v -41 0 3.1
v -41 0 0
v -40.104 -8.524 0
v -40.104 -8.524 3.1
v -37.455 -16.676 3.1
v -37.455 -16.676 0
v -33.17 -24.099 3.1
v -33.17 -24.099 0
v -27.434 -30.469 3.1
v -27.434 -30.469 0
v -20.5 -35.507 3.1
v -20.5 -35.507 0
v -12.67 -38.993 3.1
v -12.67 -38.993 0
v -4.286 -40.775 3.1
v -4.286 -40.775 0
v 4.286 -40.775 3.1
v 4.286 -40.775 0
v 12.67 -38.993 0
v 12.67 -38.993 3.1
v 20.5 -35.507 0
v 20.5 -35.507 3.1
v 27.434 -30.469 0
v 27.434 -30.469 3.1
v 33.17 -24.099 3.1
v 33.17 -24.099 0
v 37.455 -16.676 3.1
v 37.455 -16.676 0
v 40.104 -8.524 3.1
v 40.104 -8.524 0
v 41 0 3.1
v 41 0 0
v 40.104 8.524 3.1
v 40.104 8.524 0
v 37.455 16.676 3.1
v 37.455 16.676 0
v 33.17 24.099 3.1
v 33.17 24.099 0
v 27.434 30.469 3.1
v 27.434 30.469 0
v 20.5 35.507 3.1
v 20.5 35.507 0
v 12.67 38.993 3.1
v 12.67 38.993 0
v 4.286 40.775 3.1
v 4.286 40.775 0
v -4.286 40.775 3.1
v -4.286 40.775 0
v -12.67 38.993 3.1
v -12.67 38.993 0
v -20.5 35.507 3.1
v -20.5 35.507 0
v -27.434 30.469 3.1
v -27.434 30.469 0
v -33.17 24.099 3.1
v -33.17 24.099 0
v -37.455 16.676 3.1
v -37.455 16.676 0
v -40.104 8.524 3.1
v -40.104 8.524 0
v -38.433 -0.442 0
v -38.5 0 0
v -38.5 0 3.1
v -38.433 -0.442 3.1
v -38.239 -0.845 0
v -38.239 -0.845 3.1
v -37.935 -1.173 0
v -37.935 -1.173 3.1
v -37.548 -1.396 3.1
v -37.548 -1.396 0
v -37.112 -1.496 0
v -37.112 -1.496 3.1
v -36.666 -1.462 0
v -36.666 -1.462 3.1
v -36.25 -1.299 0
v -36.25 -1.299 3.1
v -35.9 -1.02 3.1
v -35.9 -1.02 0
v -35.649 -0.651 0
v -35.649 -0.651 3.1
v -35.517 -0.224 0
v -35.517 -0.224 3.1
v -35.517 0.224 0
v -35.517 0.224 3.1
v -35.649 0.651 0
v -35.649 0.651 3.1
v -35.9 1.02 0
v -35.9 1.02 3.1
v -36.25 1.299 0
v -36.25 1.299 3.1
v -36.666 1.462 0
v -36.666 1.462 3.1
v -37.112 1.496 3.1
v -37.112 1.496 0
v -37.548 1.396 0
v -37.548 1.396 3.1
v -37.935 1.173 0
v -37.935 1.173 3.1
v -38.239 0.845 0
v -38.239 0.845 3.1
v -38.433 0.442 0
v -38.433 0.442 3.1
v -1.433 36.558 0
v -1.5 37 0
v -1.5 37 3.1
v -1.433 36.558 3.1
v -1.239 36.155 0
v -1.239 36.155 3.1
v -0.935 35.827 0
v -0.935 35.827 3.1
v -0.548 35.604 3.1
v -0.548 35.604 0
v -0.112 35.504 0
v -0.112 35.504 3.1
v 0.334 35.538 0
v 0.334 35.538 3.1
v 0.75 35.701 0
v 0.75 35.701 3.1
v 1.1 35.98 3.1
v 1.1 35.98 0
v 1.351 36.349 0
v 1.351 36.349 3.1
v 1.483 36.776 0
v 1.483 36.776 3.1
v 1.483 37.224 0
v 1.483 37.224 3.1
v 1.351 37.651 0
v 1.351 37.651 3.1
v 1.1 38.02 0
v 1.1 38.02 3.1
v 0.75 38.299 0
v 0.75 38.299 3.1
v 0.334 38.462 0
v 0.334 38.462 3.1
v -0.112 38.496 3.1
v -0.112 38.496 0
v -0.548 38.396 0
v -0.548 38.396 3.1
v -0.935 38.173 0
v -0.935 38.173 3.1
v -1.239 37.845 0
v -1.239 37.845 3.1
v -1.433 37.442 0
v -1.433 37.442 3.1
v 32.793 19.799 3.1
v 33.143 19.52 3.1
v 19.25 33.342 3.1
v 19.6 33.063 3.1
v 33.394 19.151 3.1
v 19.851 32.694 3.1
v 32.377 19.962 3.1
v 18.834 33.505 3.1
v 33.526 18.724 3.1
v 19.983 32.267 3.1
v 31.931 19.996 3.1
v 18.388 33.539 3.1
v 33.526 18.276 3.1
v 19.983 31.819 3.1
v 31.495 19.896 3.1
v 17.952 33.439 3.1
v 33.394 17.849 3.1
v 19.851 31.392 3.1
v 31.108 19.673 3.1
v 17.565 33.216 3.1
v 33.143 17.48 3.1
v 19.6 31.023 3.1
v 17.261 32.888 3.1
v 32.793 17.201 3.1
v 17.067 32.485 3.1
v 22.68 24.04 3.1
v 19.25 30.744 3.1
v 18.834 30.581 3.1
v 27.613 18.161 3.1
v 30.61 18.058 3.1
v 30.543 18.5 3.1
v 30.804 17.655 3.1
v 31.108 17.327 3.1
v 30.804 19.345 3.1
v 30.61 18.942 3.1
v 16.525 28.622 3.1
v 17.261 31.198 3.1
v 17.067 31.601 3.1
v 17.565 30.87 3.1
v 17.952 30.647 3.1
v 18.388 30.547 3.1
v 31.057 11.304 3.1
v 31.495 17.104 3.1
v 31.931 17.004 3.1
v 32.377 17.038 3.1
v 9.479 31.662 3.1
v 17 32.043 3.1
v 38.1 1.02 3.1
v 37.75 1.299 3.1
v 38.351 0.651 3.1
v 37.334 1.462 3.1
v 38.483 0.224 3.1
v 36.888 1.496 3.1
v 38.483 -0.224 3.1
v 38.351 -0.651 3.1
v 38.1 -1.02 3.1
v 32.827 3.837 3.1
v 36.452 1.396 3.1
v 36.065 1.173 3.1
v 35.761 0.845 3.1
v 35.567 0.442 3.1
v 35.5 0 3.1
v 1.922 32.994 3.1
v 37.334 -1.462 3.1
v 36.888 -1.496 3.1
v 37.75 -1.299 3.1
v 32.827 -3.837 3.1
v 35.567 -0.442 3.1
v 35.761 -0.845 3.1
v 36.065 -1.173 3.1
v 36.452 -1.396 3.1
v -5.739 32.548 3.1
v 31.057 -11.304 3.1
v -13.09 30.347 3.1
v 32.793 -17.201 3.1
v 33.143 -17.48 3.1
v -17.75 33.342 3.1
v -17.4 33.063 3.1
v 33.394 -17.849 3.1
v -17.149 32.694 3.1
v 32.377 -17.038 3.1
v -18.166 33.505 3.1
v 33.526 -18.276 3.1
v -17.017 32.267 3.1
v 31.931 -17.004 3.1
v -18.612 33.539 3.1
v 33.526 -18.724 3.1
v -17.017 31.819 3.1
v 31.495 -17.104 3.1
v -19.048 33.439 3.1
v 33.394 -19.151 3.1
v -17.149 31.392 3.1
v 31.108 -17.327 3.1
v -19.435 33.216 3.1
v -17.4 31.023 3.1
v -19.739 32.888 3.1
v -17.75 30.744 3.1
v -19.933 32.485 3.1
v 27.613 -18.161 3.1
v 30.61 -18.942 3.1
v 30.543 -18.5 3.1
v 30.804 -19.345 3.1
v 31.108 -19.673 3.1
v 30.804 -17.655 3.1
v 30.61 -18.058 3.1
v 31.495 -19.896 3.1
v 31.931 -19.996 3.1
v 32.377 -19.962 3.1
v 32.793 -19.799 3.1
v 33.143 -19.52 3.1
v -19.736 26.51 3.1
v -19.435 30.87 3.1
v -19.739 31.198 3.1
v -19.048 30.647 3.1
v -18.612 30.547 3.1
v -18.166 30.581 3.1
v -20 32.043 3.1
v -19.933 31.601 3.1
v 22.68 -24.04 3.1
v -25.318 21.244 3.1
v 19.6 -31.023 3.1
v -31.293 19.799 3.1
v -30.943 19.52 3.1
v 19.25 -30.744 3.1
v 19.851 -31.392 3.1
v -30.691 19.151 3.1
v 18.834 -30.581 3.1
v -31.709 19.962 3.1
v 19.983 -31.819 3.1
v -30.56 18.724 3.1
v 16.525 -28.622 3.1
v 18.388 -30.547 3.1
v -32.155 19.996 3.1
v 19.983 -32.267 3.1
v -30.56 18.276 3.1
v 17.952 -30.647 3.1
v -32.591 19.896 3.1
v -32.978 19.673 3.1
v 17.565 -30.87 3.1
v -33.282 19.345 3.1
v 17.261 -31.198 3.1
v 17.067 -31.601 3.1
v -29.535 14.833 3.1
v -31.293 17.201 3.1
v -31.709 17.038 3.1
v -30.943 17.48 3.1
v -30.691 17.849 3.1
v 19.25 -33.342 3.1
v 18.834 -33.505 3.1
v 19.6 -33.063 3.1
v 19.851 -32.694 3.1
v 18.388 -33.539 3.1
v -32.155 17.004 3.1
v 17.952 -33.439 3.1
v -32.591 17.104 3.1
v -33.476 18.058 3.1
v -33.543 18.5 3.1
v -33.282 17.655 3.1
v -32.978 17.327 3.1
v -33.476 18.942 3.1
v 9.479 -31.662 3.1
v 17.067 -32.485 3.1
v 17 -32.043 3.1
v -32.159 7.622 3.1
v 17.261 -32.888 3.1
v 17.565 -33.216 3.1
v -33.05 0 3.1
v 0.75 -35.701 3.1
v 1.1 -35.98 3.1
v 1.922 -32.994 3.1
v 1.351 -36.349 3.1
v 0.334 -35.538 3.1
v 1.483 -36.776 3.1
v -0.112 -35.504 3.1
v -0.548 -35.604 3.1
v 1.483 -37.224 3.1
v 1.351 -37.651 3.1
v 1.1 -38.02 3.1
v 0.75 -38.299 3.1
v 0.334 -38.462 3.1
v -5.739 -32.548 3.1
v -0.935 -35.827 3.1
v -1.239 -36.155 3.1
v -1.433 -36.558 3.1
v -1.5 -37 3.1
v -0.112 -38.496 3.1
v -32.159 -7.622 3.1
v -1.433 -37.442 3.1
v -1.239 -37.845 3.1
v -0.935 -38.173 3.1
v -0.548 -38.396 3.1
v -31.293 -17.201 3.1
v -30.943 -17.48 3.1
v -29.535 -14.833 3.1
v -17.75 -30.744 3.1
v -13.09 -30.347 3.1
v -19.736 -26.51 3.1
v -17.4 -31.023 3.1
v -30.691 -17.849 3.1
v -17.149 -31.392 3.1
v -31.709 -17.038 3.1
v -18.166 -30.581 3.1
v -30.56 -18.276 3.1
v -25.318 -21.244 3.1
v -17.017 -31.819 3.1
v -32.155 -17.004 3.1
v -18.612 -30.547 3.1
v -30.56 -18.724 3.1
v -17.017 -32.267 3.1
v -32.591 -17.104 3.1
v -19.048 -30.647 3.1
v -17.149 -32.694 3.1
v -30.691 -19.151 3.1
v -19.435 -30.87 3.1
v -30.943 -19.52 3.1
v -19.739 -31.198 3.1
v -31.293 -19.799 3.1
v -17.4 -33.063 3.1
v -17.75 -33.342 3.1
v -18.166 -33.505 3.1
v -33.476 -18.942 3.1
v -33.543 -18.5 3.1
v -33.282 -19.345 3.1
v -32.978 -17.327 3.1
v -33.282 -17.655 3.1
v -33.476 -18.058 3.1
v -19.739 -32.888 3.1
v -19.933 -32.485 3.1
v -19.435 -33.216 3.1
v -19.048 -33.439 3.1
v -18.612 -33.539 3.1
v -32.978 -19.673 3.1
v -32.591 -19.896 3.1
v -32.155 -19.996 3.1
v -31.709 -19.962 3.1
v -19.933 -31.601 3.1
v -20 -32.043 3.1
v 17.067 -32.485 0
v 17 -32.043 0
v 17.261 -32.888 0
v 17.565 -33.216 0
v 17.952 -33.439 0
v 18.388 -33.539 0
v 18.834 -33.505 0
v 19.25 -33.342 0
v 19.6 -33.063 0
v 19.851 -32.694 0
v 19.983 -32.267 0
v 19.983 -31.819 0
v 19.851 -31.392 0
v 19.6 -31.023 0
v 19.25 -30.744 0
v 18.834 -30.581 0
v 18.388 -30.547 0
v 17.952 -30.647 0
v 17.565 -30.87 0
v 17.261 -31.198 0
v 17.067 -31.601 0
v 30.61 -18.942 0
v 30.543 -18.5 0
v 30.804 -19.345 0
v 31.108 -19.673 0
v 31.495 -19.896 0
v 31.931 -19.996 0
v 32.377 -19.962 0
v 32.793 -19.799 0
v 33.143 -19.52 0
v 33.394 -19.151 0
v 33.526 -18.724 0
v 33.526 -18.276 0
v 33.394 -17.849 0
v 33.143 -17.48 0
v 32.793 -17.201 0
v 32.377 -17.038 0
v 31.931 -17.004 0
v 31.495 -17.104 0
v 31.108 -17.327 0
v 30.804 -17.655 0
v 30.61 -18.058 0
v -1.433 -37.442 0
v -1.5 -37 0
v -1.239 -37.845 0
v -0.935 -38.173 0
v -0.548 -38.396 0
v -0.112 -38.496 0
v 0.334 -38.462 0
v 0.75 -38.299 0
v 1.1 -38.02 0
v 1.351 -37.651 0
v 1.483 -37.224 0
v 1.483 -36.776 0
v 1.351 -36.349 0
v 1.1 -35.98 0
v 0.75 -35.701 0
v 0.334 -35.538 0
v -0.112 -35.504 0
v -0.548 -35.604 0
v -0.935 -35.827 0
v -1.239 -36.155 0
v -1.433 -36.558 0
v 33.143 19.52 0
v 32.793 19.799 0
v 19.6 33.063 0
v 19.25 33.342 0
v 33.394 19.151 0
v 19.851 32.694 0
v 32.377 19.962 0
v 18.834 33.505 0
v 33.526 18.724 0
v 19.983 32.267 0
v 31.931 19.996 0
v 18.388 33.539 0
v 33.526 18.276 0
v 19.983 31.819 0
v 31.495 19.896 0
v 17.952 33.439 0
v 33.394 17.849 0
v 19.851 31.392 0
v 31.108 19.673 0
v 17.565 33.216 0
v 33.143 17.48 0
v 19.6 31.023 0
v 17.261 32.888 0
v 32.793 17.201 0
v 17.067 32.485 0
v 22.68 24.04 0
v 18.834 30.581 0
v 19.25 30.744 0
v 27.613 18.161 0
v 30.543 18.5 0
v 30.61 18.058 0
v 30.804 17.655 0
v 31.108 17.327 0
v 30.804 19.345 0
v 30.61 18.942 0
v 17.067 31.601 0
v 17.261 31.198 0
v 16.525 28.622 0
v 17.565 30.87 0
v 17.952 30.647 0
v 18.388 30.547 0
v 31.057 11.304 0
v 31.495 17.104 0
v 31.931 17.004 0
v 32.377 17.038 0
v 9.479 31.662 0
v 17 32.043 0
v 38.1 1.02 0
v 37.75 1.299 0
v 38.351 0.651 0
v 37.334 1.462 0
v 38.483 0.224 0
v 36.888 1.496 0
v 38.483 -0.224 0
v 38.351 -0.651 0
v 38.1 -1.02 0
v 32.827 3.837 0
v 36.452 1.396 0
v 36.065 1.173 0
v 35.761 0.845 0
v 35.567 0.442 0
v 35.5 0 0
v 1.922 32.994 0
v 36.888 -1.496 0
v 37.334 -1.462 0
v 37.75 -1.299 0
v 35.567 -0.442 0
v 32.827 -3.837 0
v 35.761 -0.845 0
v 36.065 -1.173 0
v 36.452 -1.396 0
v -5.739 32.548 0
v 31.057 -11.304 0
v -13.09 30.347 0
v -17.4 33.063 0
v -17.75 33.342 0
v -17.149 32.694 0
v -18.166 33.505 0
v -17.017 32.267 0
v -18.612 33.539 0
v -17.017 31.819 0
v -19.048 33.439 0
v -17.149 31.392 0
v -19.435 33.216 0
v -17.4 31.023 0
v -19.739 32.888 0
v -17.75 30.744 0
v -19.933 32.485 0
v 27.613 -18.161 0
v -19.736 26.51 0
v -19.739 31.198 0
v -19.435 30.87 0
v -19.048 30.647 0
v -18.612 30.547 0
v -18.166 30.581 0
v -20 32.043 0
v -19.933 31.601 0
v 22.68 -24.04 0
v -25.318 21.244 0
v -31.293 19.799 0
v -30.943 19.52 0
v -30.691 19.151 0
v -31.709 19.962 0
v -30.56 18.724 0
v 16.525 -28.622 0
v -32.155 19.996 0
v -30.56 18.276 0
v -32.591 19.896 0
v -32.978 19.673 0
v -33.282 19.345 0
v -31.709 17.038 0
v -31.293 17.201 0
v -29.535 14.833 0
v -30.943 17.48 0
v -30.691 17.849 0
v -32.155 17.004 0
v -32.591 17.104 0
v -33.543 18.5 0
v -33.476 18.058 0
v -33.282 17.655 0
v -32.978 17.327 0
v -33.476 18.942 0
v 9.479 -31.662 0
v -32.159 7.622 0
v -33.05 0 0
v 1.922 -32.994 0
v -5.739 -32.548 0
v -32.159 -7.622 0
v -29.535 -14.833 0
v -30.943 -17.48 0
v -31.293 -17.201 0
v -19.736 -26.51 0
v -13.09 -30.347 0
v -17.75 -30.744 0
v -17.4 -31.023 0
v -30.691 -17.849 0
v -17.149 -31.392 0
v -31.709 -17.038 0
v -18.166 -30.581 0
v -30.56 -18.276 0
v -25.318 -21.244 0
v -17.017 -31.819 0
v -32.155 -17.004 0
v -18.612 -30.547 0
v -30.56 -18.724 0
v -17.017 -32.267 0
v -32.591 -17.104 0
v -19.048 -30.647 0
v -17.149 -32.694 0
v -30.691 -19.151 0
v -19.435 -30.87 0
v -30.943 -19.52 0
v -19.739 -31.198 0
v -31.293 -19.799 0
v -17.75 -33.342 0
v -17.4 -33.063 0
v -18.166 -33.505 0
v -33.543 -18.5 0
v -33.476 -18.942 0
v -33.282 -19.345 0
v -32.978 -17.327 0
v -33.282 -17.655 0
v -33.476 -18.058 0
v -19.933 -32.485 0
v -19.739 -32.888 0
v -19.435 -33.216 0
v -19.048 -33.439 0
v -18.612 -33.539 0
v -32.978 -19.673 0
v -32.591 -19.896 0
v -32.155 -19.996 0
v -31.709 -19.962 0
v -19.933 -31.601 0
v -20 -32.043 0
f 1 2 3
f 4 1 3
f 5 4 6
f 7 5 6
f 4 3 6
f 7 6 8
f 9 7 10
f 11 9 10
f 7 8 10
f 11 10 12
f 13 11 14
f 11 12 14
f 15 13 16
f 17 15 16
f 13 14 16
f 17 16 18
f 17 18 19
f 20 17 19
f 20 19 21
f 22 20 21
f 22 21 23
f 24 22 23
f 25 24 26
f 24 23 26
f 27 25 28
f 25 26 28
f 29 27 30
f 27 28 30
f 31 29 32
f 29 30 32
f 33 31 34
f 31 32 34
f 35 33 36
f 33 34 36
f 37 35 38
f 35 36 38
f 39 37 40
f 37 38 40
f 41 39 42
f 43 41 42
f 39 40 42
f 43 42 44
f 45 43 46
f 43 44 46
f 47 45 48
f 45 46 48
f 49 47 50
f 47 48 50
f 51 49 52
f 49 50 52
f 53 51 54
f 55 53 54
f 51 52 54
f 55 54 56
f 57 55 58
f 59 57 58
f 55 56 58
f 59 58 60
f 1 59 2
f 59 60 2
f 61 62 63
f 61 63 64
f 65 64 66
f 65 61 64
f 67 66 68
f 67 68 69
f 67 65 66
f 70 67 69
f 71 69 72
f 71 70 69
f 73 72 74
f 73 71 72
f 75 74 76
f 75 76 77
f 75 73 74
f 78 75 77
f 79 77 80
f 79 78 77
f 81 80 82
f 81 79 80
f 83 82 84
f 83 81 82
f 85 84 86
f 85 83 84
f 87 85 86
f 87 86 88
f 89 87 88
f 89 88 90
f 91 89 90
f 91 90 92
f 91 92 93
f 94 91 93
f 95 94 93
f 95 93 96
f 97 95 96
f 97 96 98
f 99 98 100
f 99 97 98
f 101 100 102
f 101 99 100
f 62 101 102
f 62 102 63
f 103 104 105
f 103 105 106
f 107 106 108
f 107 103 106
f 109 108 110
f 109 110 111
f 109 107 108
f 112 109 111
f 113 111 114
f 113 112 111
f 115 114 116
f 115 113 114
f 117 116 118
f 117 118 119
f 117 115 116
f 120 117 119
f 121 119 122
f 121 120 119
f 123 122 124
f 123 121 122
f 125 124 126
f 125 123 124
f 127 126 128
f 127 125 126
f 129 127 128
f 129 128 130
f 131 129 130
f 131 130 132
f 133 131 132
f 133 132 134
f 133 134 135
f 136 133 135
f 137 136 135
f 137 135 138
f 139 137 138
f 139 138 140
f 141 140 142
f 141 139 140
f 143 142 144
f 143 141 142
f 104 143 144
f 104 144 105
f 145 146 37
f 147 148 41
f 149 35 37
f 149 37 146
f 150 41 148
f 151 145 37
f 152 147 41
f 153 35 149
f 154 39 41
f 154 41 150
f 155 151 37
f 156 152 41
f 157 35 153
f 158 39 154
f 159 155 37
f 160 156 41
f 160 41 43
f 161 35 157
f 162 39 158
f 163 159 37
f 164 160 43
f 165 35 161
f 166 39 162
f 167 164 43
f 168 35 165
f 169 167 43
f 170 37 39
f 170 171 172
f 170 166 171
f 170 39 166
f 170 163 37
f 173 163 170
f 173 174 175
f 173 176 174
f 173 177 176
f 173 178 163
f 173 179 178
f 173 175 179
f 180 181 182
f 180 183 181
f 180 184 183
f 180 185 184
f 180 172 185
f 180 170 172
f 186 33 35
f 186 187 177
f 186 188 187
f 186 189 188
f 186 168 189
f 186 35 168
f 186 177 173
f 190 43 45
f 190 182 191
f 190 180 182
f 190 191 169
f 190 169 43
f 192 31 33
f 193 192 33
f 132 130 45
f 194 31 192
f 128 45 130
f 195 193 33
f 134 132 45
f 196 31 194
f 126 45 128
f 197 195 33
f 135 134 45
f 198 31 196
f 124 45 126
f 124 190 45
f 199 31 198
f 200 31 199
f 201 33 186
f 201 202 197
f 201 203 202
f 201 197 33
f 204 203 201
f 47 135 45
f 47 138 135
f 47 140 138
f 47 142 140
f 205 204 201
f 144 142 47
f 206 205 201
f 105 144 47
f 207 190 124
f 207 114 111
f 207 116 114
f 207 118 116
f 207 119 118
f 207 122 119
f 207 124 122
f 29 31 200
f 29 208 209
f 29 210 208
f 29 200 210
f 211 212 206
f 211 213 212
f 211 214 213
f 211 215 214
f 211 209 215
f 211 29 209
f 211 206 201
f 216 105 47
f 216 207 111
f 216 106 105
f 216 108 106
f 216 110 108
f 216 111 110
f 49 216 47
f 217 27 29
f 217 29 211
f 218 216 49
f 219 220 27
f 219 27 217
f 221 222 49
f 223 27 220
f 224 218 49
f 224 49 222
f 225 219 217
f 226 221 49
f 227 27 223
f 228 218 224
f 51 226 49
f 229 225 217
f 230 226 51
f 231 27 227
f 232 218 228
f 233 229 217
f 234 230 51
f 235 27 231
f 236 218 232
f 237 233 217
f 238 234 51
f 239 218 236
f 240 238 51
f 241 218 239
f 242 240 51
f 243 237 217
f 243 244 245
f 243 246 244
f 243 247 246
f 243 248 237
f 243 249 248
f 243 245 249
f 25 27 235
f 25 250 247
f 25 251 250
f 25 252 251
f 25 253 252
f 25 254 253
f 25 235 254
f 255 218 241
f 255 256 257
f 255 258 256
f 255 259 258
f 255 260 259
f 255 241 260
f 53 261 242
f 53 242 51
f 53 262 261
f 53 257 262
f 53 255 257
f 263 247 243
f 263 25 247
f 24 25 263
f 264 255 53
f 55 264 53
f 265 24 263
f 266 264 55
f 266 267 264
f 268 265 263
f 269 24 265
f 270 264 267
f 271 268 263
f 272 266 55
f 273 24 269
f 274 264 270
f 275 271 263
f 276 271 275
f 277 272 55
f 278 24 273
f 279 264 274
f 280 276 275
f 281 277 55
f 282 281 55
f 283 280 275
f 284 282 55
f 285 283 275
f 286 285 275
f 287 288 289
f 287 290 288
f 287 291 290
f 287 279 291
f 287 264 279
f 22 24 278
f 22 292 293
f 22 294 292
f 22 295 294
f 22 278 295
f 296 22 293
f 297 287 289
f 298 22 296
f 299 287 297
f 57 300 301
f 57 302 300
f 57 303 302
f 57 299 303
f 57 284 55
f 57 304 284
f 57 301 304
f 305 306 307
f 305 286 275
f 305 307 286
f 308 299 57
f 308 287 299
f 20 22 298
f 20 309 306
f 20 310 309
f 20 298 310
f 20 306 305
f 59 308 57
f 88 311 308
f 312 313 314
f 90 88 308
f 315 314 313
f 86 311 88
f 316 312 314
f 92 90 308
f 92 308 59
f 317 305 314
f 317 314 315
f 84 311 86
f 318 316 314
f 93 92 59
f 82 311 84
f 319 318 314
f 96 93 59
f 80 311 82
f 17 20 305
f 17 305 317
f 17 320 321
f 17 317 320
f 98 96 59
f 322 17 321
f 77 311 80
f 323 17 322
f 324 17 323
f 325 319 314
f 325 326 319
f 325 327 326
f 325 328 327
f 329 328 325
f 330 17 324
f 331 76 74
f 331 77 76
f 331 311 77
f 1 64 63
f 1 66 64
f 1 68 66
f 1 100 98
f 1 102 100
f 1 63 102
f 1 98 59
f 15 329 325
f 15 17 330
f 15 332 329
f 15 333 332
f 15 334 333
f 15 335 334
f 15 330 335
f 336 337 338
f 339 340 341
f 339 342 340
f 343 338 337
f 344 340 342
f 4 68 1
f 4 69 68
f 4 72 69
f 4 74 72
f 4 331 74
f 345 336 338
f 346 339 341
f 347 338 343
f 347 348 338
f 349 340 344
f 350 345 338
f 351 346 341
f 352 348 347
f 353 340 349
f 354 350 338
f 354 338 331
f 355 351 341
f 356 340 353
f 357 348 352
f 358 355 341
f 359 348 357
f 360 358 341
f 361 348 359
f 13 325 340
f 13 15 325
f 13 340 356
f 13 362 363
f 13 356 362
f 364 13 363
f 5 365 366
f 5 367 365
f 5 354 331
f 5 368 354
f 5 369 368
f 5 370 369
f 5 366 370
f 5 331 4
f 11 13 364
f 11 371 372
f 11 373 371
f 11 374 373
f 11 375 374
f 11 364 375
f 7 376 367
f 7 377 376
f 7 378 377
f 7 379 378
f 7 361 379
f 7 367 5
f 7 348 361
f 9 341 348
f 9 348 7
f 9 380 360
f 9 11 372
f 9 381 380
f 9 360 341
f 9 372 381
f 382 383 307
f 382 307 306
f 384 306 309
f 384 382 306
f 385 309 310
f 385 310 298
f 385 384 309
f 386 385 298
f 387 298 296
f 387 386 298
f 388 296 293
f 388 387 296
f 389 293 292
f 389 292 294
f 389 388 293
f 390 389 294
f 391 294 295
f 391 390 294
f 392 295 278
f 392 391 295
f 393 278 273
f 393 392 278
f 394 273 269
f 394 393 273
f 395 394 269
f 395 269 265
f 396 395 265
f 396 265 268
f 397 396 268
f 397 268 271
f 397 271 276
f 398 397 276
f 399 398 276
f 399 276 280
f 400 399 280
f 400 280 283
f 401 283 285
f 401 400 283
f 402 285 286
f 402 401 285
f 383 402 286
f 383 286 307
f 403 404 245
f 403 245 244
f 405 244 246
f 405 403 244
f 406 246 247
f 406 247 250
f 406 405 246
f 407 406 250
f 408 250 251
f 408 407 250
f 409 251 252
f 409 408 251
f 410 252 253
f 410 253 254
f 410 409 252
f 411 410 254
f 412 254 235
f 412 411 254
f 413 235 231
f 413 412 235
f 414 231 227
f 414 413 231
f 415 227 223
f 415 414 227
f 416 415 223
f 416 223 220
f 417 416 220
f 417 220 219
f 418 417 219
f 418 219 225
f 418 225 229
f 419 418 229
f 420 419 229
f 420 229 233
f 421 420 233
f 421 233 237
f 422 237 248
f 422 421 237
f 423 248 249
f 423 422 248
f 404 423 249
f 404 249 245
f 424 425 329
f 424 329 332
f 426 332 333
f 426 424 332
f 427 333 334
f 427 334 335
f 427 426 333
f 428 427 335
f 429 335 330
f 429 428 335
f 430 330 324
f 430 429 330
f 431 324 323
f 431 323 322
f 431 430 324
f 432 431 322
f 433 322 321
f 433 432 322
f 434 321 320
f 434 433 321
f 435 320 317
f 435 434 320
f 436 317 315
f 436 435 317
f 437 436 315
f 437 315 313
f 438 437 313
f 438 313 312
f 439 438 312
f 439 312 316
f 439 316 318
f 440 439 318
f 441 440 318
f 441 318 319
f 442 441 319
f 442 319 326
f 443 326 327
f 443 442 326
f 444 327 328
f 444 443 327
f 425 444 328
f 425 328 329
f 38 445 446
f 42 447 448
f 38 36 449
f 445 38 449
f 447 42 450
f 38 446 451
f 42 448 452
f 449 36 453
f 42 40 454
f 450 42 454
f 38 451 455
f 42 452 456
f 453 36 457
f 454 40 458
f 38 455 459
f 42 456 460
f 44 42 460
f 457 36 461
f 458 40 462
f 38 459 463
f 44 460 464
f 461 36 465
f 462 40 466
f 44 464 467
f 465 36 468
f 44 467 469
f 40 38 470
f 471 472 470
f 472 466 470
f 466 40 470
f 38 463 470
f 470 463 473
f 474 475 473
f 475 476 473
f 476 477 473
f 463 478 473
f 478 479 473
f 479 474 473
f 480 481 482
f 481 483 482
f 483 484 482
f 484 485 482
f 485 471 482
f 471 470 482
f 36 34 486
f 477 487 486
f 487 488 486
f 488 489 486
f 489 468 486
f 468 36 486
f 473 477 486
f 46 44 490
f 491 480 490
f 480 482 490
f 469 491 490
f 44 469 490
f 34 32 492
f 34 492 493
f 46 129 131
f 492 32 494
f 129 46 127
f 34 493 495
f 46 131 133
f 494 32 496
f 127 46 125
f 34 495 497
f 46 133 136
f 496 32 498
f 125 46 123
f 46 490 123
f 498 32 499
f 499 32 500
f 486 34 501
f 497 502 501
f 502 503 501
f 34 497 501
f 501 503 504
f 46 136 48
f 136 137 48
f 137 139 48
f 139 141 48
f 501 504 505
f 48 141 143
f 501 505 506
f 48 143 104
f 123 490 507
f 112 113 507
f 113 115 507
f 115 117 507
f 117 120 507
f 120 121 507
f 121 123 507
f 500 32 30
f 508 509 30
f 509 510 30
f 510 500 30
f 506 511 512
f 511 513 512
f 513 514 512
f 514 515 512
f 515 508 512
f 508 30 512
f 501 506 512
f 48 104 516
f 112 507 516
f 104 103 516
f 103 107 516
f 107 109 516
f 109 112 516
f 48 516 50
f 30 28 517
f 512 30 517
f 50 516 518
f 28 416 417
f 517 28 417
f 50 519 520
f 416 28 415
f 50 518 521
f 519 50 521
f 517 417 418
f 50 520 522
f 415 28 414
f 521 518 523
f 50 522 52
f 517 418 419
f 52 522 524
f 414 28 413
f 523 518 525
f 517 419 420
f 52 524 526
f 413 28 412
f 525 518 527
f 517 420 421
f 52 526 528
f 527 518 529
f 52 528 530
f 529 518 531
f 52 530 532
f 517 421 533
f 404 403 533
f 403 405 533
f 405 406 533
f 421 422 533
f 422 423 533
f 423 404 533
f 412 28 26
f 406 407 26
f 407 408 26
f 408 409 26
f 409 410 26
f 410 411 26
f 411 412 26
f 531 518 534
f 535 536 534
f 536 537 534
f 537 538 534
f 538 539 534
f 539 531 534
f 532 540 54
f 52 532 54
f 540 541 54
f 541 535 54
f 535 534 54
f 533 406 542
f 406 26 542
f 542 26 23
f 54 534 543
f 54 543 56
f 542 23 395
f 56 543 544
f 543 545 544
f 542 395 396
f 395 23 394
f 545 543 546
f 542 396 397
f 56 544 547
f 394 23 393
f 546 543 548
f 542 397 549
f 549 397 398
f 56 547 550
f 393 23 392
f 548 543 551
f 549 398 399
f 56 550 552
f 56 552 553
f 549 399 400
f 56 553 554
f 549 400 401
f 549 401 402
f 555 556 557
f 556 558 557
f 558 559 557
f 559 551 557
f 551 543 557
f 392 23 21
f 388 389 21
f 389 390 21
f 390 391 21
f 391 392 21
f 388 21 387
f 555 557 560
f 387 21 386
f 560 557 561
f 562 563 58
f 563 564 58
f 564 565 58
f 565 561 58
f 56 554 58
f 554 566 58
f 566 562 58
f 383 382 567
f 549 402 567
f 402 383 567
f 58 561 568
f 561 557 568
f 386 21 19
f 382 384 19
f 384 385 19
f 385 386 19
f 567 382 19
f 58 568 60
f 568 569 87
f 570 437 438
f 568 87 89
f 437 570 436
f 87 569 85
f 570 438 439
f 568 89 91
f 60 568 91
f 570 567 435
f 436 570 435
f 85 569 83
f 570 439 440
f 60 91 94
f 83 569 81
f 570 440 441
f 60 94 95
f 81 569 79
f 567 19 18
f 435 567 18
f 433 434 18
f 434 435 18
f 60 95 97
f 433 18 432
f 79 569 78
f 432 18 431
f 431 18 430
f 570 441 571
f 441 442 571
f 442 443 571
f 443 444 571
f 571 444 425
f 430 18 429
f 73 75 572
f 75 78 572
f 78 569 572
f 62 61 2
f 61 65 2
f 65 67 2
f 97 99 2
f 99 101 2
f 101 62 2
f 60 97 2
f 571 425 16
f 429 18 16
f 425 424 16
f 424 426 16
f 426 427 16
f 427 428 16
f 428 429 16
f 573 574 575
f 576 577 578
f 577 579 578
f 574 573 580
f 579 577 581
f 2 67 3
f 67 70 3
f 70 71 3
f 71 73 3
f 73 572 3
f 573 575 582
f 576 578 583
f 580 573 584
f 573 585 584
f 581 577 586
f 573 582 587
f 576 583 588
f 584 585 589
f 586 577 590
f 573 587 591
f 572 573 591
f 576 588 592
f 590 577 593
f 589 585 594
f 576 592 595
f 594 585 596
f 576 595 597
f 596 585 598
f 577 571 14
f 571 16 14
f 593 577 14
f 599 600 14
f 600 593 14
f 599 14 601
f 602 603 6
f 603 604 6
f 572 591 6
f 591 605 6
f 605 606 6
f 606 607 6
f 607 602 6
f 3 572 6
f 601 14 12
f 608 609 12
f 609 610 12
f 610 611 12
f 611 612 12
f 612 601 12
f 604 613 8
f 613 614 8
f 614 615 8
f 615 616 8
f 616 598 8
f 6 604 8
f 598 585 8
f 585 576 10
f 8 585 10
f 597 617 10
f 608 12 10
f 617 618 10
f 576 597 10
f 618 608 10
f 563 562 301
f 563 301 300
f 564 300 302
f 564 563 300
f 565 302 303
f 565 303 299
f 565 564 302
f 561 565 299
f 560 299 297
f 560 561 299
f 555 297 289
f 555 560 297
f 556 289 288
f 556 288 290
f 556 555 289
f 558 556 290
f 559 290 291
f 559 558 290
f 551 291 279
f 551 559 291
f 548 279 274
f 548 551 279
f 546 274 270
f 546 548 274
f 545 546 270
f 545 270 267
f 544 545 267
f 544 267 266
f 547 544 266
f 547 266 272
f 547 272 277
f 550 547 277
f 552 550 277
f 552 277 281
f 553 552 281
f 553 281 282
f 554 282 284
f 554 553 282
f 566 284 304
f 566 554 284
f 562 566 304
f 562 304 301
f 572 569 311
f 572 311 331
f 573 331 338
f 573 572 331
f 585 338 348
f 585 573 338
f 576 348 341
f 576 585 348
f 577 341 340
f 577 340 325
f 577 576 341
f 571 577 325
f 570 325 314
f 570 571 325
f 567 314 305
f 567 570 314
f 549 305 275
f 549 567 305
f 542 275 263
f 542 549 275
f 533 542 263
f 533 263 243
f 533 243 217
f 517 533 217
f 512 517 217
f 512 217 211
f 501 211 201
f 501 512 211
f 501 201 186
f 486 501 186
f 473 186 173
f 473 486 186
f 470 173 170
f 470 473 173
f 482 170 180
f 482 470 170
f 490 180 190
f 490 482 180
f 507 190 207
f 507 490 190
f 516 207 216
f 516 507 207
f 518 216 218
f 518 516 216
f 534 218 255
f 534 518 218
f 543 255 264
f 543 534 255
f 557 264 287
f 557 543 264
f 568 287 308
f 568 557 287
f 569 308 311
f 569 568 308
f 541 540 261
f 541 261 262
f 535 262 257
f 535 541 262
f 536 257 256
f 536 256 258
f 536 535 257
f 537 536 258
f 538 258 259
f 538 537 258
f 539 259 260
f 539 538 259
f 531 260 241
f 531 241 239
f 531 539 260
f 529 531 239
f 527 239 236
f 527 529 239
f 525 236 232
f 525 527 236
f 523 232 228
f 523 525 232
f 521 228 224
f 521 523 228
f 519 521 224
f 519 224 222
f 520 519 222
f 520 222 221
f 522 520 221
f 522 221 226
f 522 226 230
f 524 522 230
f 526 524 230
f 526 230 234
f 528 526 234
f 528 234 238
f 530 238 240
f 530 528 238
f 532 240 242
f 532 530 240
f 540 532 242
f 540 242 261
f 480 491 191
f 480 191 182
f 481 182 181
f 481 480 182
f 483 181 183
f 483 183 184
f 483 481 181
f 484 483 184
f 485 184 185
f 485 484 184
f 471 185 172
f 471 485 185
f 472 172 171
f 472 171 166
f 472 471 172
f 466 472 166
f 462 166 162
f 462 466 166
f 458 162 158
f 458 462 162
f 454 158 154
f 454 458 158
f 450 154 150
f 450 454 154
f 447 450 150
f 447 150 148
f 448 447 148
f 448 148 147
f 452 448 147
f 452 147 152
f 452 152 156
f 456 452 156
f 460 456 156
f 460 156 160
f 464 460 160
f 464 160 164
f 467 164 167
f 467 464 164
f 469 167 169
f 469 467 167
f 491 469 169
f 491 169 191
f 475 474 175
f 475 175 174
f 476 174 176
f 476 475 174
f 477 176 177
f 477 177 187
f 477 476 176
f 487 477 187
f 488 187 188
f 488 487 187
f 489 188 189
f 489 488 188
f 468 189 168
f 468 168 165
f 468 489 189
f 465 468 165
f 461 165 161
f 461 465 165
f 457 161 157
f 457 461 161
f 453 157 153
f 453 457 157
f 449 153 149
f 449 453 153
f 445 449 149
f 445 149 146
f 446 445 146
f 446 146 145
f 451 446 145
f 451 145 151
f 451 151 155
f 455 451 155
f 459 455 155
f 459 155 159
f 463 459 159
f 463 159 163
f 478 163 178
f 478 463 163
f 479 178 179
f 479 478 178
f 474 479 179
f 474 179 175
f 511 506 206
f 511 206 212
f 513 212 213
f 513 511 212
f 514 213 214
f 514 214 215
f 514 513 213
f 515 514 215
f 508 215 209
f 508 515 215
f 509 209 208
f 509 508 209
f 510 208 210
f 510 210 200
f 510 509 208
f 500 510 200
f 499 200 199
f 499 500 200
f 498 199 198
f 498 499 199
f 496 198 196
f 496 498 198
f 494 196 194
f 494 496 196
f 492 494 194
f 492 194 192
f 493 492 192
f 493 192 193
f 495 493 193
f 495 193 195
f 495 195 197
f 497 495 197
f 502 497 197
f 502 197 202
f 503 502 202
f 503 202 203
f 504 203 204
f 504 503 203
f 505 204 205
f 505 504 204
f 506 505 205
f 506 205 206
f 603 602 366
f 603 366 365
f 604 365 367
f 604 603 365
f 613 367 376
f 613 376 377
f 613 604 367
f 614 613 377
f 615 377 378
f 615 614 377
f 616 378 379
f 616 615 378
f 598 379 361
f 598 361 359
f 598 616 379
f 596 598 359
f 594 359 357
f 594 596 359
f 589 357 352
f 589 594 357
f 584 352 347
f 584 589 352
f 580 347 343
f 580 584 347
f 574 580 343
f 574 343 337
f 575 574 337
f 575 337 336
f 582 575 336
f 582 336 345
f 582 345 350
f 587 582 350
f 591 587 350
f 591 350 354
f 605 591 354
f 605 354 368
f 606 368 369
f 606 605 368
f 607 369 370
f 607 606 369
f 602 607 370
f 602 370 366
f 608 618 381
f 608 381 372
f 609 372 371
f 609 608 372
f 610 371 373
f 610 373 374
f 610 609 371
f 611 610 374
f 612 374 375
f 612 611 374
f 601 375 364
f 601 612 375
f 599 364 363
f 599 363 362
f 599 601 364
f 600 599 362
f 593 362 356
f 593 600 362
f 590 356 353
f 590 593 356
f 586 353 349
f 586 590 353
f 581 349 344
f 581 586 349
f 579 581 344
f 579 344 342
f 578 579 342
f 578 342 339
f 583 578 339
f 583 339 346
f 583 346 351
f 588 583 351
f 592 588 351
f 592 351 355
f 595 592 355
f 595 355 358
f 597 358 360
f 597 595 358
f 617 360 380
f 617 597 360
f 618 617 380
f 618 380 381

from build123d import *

# Parameters (mm, degrees)
SKETCH_1_R      = 41
SKETCH_1_R_2    = 33.05
SKETCH_1_R_3    = 1.5
EXTRUDE_1_DEPTH = 3.1


with BuildPart() as part:
    # 草图1 → 凸台-拉伸1 (new body)
    with BuildSketch(Plane.XY):
        with Locations(Location((0, 0, 0), (0, 0, 180))):
            Circle(SKETCH_1_R)
        with Locations(Location((0, 0, 0), (0, 0, 180))):
            Circle(SKETCH_1_R_2, mode=Mode.SUBTRACT)
        with Locations(Location((0, 37, 0), (0, 0, 180))):
            Circle(SKETCH_1_R_3, mode=Mode.SUBTRACT)
        with Locations(Location((18.5, 32.04293994, 0), (0, 0, 180))):
            Circle(SKETCH_1_R_3, mode=Mode.SUBTRACT)
        with Locations(Location((32.04293994, 18.5, 0), (0, 0, 180))):
            Circle(SKETCH_1_R_3, mode=Mode.SUBTRACT)
        with Locations(Location((37, 0, 0), (0, 0, 180))):
            Circle(SKETCH_1_R_3, mode=Mode.SUBTRACT)
        with Locations(Location((32.04293994, -18.5, 0), (0, 0, 180))):
            Circle(SKETCH_1_R_3, mode=Mode.SUBTRACT)
        with Locations(Location((18.5, -32.04293994, 0), (0, 0, 180))):
            Circle(SKETCH_1_R_3, mode=Mode.SUBTRACT)
        with Locations(Location((0, -37, 0), (0, 0, 180))):
            Circle(SKETCH_1_R_3, mode=Mode.SUBTRACT)
        with Locations(Location((-18.5, -32.04293994, 0), (0, 0, 180))):
            Circle(SKETCH_1_R_3, mode=Mode.SUBTRACT)
        with Locations(Location((-32.04293994, -18.5, 0), (0, 0, 180))):
            Circle(SKETCH_1_R_3, mode=Mode.SUBTRACT)
        with Locations(Location((-37, 0, 0), (0, 0, 180))):
            Circle(SKETCH_1_R_3, mode=Mode.SUBTRACT)
        with Locations(Location((-32.04293994, 18.5, 0), (0, 0, 180))):
            Circle(SKETCH_1_R_3, mode=Mode.SUBTRACT)
        with Locations(Location((-18.5, 32.04293994, 0), (0, 0, 180))):
            Circle(SKETCH_1_R_3, mode=Mode.SUBTRACT)
    extrude(amount=EXTRUDE_1_DEPTH)


solid = part.part
